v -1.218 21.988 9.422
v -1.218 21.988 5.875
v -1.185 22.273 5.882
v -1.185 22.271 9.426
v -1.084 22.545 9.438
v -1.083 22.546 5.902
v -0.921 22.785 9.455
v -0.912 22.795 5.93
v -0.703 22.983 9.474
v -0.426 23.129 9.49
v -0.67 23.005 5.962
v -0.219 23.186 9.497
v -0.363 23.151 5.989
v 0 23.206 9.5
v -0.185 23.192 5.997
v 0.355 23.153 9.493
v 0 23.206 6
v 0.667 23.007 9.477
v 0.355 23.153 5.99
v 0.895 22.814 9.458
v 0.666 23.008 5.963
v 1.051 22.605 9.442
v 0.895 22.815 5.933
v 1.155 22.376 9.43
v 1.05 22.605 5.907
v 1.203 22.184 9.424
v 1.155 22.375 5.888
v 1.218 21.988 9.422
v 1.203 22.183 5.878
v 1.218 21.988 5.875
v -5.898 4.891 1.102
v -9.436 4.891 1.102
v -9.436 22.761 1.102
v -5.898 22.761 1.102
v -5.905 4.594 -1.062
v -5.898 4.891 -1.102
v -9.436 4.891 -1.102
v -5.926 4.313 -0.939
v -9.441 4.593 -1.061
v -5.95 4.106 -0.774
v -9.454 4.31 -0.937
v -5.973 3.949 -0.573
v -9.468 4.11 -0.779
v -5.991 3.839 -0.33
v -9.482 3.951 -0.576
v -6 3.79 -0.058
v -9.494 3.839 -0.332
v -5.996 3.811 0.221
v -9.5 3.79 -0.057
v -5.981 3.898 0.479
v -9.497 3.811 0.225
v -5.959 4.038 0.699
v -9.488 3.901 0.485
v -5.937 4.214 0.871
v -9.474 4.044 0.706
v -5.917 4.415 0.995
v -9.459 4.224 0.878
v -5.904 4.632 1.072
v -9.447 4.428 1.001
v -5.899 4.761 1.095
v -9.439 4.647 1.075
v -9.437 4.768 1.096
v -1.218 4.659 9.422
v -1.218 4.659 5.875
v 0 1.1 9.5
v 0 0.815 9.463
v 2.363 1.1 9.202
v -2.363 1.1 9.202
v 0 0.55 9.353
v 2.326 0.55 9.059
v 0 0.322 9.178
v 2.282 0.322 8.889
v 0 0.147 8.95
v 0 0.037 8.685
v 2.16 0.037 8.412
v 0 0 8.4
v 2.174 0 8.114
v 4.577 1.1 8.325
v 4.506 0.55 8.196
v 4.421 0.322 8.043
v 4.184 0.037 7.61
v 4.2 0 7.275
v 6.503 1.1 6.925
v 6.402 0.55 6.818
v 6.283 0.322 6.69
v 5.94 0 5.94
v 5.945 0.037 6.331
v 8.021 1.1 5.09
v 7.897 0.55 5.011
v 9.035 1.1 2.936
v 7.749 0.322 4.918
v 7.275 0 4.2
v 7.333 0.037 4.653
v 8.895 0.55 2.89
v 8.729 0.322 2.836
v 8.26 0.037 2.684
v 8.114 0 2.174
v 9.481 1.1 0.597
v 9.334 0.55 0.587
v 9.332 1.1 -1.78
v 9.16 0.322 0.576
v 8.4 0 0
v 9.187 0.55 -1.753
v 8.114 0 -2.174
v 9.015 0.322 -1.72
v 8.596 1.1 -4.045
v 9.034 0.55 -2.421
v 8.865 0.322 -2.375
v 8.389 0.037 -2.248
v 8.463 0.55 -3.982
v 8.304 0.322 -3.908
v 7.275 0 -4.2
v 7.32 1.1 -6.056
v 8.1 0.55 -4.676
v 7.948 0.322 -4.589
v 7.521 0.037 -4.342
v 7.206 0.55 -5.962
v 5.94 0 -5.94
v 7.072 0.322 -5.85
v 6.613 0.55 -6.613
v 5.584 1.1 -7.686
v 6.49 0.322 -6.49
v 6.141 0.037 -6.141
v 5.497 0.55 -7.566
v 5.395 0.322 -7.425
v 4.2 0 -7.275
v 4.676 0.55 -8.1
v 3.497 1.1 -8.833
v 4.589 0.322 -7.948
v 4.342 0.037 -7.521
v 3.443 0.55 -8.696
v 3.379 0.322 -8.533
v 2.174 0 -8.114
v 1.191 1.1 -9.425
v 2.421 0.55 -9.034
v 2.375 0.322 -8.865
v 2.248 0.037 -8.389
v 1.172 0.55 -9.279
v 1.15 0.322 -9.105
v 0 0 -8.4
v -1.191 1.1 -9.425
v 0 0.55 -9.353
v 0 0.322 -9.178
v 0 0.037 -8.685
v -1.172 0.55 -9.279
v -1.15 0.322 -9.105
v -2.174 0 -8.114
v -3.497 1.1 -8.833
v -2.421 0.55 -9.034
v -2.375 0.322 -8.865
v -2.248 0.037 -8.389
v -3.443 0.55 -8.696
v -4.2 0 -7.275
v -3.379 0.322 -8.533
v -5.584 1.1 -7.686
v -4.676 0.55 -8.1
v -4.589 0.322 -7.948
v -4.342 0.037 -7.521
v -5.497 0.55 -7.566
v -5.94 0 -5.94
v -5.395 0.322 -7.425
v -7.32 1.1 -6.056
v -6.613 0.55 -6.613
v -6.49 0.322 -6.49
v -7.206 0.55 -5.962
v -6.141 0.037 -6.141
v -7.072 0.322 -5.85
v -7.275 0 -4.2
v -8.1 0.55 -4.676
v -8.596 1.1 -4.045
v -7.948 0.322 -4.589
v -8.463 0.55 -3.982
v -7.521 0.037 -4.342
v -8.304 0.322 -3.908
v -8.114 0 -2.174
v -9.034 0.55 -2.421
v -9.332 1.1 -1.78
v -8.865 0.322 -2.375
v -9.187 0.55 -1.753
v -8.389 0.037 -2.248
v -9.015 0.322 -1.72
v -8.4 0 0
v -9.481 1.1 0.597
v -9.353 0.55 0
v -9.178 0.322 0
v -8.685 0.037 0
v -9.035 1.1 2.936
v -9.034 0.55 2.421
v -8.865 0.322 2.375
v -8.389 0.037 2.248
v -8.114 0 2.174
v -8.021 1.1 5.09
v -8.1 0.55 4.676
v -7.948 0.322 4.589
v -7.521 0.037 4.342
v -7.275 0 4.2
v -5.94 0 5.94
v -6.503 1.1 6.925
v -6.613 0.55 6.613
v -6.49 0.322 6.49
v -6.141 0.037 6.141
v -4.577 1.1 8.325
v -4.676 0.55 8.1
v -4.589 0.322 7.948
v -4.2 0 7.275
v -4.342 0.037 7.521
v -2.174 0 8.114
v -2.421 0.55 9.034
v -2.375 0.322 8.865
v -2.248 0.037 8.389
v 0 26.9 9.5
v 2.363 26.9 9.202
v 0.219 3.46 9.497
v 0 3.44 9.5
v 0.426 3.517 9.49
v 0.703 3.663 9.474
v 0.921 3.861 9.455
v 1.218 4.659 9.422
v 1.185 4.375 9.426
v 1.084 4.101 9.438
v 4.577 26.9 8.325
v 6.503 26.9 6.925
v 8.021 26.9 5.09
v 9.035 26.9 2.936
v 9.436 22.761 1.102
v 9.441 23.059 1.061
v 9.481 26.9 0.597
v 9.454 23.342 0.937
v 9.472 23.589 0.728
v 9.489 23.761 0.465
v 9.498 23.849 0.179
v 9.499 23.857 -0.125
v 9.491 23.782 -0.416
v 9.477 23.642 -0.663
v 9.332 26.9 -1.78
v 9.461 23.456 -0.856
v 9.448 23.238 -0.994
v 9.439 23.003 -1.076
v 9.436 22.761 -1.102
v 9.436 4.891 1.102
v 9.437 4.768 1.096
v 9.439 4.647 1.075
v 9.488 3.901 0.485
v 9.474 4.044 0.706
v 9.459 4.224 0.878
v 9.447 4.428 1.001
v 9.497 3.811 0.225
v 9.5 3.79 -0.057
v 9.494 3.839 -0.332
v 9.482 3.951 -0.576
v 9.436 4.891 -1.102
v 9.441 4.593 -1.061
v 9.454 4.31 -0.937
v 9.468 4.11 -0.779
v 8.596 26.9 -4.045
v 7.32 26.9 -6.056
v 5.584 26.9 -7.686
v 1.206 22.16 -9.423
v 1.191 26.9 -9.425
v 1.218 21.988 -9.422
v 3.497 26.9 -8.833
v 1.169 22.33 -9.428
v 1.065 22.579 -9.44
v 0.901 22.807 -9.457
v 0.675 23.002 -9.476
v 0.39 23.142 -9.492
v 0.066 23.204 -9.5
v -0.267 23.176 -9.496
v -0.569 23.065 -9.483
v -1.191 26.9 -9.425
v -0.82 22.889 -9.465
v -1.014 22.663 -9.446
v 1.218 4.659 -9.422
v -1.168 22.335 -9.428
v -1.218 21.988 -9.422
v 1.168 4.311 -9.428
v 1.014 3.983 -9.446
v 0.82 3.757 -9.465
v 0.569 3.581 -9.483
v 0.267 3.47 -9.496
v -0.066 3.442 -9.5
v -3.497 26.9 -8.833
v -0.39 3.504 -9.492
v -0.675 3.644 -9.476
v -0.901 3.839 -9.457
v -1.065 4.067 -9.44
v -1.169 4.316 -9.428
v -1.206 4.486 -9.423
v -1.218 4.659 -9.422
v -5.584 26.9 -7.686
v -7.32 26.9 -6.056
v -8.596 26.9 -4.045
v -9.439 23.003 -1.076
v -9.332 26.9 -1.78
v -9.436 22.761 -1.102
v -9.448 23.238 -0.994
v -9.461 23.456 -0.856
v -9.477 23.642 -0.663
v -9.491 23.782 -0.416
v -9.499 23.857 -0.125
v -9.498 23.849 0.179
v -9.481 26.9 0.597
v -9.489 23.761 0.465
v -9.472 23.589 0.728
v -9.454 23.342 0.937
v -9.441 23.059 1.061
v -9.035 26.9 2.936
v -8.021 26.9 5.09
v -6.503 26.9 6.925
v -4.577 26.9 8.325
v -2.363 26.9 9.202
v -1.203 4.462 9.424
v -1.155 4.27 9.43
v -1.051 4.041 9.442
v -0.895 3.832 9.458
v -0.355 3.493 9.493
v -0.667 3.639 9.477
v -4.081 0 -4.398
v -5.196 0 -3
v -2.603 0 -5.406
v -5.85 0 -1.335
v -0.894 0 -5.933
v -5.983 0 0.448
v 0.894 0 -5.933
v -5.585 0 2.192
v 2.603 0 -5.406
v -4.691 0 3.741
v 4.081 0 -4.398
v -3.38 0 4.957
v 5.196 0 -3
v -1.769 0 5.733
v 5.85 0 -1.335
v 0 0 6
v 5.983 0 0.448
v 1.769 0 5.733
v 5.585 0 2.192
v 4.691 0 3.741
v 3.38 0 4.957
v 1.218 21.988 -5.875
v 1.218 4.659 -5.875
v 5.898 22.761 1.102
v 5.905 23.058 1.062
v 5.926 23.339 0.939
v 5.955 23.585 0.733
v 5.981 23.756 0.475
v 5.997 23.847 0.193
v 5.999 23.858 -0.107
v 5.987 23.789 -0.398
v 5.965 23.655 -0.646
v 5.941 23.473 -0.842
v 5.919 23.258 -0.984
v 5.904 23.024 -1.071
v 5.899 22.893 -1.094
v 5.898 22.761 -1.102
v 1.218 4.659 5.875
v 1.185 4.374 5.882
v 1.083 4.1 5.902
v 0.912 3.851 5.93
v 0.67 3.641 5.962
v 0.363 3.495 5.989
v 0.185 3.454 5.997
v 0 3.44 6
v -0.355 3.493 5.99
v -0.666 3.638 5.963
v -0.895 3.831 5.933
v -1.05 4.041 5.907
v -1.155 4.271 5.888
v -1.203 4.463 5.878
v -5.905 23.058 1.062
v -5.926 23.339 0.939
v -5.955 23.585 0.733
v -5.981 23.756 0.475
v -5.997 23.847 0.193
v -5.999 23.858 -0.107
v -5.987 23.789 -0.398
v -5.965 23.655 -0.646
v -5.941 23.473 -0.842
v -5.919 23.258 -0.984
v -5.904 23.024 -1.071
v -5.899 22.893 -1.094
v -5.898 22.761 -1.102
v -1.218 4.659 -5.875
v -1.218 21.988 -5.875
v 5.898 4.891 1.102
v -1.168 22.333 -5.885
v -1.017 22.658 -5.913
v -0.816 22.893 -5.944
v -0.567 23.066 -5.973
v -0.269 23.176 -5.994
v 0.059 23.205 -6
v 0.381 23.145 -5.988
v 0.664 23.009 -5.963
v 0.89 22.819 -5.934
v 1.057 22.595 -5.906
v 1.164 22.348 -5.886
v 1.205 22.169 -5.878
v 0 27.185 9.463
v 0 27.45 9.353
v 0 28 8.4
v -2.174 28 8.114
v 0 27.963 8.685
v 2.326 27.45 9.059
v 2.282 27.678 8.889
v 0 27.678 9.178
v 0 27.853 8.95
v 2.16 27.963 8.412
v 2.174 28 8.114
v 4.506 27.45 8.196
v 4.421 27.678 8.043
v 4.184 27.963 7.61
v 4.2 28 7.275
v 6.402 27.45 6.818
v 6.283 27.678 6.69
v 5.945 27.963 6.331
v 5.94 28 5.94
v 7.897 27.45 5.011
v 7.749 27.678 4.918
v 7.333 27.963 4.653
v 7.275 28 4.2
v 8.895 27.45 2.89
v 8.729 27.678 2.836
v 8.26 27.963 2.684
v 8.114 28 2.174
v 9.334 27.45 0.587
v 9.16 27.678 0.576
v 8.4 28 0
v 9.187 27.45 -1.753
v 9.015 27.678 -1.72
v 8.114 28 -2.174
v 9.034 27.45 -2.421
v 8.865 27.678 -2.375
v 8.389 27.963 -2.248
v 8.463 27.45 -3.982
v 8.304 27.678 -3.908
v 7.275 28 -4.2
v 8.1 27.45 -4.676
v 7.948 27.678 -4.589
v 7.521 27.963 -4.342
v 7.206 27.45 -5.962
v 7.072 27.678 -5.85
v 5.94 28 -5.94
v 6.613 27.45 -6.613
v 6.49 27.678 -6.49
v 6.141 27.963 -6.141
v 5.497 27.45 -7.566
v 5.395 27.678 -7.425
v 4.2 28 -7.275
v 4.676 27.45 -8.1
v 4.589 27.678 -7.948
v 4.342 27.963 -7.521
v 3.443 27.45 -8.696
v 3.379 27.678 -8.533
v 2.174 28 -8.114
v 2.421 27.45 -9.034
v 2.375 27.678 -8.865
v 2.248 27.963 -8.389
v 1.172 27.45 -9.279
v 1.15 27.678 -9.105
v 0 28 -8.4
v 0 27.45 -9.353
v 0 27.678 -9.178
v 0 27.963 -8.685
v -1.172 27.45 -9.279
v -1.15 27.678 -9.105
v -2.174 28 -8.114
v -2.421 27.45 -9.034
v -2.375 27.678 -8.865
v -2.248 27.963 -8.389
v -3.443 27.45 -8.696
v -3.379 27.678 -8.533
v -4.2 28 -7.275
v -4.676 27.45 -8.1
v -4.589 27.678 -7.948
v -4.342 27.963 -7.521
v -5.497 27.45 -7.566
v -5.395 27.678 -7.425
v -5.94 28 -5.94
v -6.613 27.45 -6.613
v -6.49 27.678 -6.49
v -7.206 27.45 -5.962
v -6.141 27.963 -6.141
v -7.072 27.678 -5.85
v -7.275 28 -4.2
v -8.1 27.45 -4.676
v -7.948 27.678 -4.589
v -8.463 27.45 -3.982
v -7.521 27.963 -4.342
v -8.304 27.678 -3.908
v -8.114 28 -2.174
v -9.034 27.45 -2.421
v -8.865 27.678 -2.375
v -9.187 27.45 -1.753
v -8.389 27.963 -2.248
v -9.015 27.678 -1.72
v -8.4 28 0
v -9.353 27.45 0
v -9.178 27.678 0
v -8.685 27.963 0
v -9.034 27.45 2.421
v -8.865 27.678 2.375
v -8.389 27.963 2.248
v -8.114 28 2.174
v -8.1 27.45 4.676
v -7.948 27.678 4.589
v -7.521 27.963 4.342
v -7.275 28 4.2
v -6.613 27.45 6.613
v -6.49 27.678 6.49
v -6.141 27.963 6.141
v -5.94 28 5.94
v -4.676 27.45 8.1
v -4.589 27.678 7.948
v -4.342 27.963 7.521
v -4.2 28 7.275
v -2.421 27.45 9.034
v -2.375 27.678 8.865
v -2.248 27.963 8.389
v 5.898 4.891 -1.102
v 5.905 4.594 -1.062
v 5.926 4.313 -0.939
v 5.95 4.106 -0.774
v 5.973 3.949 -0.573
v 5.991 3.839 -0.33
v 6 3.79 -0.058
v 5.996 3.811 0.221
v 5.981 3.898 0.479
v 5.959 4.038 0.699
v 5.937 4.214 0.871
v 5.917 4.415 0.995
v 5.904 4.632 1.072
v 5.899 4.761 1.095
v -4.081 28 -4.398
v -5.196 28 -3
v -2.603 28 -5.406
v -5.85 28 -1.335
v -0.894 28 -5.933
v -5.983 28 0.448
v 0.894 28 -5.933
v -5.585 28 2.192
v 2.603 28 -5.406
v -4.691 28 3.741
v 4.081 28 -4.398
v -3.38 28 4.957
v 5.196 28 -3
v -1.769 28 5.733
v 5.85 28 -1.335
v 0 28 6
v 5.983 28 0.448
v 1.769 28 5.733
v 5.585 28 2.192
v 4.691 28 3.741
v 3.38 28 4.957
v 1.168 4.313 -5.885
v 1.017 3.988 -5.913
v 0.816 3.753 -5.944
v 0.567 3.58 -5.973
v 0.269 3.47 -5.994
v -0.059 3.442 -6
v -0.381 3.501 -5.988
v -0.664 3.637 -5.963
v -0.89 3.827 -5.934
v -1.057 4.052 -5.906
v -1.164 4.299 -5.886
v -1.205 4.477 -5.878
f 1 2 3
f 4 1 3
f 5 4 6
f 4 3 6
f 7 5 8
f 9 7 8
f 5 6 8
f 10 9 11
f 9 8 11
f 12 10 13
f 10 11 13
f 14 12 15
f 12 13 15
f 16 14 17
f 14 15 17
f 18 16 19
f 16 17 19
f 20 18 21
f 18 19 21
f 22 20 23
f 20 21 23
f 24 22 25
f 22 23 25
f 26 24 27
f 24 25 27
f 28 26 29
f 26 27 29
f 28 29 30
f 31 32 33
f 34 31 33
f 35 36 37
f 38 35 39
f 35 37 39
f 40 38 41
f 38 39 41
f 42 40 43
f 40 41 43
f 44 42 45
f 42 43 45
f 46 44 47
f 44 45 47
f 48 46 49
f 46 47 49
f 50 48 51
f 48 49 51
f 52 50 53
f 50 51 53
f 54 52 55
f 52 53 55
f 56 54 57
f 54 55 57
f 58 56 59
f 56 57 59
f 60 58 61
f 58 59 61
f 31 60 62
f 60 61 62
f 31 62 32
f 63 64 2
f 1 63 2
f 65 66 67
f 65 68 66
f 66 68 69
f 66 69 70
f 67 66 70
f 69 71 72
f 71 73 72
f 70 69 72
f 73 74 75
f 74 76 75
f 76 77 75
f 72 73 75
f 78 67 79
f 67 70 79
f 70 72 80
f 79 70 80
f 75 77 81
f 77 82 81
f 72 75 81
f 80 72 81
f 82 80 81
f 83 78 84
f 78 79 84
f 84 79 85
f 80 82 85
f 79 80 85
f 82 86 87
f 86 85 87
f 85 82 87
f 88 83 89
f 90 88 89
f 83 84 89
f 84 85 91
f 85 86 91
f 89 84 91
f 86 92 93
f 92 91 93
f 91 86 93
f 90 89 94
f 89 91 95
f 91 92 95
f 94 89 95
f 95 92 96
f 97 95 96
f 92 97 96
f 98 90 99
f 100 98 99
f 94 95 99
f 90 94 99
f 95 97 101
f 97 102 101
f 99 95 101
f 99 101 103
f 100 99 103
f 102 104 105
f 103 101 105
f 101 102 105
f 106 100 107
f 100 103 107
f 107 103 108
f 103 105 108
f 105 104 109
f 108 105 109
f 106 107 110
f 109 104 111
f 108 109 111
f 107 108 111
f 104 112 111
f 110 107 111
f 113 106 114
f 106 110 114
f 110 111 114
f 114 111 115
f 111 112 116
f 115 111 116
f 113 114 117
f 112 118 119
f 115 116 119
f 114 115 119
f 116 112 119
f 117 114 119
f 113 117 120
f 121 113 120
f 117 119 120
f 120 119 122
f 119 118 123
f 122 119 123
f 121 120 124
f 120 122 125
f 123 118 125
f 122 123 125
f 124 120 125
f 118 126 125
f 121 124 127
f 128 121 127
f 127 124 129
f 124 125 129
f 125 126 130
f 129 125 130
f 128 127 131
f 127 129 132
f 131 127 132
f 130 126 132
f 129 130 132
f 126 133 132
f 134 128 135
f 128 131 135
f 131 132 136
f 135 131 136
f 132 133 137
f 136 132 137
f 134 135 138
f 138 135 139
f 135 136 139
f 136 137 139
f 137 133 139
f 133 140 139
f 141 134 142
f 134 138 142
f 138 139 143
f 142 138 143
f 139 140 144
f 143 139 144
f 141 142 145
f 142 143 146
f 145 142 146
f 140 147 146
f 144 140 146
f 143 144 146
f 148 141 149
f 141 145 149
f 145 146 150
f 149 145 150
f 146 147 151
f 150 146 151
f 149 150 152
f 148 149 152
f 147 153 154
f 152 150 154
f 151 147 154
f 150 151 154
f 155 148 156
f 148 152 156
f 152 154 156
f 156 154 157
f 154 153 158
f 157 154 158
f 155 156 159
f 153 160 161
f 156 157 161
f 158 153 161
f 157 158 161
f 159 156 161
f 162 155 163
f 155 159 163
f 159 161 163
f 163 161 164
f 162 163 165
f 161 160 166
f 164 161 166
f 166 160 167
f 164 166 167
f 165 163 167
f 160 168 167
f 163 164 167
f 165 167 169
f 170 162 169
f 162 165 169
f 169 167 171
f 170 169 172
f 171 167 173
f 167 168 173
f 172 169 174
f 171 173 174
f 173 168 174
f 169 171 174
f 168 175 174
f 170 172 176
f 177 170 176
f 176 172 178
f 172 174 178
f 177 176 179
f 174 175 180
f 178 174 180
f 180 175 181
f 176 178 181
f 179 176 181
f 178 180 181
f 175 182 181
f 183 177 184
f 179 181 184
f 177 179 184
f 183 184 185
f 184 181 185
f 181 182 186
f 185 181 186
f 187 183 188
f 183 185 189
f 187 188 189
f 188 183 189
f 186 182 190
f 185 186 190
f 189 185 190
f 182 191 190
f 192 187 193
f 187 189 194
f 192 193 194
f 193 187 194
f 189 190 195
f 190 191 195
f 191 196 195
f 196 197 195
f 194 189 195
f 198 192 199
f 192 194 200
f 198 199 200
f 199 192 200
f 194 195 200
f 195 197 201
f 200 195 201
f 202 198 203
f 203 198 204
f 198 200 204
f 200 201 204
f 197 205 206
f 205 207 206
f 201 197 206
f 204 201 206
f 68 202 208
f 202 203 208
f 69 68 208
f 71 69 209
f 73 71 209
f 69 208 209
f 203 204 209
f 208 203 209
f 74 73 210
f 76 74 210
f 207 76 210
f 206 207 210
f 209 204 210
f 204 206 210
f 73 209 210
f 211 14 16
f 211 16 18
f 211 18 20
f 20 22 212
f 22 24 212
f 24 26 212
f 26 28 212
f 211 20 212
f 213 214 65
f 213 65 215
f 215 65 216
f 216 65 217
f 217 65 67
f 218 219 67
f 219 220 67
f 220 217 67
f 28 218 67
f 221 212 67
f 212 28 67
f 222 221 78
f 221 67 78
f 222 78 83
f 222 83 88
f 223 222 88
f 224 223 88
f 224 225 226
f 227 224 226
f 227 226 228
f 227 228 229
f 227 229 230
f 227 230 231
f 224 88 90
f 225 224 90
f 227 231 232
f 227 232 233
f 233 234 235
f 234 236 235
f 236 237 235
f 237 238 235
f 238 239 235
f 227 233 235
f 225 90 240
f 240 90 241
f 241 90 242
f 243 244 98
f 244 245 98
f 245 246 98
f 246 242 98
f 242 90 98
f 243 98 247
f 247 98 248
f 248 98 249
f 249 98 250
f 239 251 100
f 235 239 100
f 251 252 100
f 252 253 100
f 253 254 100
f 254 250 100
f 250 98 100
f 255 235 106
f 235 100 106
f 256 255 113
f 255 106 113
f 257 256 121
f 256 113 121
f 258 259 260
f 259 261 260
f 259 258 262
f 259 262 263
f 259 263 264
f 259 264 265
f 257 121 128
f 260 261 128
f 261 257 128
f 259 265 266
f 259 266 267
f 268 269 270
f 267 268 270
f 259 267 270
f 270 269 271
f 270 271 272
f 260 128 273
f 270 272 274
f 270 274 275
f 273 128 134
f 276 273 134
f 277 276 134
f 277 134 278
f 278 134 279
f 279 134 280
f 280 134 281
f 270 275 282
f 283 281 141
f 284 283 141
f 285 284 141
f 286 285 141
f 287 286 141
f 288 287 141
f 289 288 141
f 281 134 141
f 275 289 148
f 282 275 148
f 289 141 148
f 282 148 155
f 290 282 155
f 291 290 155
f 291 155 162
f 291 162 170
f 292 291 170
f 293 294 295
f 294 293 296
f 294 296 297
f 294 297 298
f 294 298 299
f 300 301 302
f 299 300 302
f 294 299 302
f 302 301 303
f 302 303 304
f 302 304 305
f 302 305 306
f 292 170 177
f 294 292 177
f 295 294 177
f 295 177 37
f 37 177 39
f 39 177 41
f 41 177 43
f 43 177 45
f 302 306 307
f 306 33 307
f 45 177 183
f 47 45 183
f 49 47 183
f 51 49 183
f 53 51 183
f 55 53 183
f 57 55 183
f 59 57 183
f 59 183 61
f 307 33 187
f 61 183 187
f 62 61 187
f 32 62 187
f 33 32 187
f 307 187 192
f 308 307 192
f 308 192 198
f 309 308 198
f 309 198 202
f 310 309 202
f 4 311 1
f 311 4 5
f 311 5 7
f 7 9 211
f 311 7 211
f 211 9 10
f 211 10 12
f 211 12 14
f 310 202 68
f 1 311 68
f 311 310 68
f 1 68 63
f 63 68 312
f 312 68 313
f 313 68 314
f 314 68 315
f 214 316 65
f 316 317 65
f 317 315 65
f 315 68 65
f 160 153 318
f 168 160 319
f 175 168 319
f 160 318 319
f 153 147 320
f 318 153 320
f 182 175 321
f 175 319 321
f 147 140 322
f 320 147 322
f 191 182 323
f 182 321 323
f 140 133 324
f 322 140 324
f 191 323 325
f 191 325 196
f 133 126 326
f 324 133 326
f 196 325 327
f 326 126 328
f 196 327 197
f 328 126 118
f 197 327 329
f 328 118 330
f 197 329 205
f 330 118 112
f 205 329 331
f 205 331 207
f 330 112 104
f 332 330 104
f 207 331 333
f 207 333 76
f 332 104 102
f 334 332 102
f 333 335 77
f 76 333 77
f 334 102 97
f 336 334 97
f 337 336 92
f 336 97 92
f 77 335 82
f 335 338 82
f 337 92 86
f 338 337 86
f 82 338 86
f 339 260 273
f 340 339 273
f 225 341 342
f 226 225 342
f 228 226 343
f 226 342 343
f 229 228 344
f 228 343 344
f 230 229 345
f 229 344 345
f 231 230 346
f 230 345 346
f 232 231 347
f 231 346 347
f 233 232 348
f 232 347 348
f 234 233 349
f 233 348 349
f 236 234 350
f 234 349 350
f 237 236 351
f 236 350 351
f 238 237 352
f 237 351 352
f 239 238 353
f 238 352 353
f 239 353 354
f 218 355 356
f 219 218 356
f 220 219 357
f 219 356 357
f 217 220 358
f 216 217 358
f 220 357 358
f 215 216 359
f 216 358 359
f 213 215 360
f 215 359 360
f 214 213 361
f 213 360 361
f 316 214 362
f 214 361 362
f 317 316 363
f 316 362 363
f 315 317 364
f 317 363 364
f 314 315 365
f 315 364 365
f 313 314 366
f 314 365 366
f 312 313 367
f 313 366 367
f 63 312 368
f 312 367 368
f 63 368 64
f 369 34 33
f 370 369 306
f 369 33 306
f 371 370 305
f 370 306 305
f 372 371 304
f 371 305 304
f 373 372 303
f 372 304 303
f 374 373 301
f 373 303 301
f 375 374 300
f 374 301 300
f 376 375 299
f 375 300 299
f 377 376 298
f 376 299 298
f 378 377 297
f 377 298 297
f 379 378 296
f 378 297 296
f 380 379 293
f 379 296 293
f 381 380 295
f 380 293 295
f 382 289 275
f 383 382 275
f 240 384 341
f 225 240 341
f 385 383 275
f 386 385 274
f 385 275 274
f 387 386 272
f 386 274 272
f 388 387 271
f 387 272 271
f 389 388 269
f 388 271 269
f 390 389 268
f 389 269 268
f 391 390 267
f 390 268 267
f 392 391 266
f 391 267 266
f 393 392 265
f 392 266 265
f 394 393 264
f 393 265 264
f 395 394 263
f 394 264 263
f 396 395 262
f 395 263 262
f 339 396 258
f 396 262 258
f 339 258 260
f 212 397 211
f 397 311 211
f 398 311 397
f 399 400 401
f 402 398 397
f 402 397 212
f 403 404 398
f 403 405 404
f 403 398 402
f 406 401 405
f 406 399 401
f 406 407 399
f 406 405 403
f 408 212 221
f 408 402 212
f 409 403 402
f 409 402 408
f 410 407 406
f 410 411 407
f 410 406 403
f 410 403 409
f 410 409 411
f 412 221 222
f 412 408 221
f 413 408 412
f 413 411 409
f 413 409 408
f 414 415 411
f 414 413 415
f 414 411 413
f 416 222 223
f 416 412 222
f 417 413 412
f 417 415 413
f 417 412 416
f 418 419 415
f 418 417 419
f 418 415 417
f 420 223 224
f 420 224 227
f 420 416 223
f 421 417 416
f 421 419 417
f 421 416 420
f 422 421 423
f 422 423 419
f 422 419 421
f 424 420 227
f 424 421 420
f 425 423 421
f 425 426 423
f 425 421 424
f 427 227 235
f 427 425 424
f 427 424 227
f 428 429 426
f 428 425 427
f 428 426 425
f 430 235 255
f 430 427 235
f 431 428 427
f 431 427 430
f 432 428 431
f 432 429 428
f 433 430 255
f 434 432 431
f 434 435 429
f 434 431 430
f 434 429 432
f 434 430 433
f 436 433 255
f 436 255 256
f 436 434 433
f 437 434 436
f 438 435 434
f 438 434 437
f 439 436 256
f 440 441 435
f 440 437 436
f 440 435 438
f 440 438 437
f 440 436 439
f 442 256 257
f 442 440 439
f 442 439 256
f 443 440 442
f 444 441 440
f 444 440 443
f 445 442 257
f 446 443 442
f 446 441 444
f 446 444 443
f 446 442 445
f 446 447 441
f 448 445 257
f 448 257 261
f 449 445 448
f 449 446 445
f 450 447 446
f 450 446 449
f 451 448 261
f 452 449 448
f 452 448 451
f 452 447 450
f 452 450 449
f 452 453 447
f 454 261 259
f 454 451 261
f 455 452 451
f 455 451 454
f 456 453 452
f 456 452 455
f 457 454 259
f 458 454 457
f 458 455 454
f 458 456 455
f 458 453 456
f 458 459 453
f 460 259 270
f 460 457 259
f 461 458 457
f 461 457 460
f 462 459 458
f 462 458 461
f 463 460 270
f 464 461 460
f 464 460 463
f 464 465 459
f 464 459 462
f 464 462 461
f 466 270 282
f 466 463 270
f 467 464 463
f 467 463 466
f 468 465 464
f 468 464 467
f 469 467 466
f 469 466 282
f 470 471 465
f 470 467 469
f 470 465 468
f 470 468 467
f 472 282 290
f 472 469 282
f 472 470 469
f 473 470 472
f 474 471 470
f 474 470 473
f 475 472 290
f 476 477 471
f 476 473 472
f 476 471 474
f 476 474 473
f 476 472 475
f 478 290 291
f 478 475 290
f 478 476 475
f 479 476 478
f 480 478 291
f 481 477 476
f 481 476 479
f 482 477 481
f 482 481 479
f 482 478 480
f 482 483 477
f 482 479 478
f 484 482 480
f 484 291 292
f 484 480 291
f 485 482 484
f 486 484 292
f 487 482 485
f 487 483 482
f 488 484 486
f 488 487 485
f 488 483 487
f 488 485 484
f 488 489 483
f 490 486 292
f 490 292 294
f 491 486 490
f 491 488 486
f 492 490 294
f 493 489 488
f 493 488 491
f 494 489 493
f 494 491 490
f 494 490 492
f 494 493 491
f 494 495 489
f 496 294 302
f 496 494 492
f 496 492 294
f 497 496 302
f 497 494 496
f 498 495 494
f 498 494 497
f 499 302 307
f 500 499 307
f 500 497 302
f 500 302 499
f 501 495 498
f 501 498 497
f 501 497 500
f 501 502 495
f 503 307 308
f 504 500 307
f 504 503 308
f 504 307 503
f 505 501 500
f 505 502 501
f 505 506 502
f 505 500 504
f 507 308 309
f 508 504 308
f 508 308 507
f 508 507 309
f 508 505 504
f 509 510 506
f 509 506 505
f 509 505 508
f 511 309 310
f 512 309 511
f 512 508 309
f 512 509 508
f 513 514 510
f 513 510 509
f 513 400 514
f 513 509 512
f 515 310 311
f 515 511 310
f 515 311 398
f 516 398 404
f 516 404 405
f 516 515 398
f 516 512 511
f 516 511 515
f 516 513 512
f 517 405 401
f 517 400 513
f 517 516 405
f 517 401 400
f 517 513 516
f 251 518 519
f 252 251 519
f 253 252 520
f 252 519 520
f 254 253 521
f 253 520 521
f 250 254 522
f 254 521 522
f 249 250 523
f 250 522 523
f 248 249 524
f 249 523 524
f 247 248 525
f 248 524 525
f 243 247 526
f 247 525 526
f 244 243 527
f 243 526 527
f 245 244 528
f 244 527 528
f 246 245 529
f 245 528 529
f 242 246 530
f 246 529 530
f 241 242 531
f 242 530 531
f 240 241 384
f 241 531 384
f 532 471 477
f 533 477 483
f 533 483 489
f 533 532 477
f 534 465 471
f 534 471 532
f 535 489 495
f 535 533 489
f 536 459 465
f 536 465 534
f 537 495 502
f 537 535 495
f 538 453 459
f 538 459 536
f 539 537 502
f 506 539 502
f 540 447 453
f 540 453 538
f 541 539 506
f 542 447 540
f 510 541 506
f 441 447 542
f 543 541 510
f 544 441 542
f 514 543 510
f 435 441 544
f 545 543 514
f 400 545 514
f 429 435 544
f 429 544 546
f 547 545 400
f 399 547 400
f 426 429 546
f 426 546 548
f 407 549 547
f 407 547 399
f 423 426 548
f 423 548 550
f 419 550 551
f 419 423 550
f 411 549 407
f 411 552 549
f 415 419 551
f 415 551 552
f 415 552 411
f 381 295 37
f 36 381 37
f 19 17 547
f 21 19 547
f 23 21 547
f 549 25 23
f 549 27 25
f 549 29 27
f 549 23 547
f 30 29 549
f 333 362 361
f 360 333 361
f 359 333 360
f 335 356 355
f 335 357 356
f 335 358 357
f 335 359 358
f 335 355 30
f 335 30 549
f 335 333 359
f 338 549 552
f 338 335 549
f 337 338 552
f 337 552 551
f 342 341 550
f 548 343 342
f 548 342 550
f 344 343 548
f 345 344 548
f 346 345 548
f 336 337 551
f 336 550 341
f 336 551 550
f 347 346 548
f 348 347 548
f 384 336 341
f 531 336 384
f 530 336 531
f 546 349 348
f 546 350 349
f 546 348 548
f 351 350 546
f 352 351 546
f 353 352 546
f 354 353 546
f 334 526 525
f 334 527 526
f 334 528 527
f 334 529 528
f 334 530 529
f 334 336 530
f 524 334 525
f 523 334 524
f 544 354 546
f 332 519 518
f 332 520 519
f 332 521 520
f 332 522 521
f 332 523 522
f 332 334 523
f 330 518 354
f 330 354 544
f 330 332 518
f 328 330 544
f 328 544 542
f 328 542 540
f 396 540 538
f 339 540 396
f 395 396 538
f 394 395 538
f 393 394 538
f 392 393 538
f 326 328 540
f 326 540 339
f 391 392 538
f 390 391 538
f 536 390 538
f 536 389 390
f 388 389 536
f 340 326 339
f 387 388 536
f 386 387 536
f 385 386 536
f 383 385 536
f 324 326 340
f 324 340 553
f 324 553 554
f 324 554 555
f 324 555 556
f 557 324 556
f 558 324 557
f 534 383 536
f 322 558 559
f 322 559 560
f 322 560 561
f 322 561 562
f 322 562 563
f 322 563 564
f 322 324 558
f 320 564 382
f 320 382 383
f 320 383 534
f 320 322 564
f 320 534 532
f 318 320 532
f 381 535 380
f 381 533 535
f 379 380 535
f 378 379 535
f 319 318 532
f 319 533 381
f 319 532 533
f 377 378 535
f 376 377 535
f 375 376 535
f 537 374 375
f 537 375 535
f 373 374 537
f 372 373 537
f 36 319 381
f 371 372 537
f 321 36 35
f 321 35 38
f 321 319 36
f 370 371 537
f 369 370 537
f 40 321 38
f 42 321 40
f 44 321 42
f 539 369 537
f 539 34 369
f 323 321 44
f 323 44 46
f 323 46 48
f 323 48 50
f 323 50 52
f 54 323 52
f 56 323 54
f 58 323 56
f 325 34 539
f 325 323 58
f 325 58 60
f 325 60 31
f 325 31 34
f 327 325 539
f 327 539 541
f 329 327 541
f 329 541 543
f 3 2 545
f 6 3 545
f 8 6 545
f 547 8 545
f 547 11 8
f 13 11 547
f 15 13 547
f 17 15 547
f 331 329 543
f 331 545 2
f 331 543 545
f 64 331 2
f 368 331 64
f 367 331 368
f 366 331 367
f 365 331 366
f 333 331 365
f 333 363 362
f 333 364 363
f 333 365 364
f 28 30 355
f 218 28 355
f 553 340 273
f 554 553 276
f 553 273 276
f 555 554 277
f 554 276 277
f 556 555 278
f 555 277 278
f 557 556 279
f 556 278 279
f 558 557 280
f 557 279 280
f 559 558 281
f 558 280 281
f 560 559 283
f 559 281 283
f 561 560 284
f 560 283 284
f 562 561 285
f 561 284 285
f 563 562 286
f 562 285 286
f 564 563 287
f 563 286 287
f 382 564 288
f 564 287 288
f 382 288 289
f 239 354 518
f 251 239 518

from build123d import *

# Parameters (mm, degrees)
SKETCH_1_R               = 9.5
SKETCH_1_R_2             = 6
EXTRUDE_1_DEPTH          = 28
FILLET_1_R               = 1.1
CUT_EXTRUDE_1_DEPTH      = 15
CUT_EXTRUDE_1_DEPTH_BACK = 17
CUT_EXTRUDE_2_DEPTH      = 17
CUT_EXTRUDE_2_DEPTH_BACK = 17


with BuildPart() as part:
    # Эскиз1 → Бобышка-Вытянуть1 (new body)
    with BuildSketch(Plane(origin=(0, 0, 0), x_dir=(1, 0, 0), z_dir=(0, 1, 0))):
        with Locations(Location((0, 0, 0), (0, 0, 270))):
            Circle(SKETCH_1_R)
        with Locations(Location((0, 0, 0), (0, 0, 270))):
            Circle(SKETCH_1_R_2, mode=Mode.SUBTRACT)
    extrude(amount=EXTRUDE_1_DEPTH)

    # Скругление1
    fillet_1_edges = [part.edges().sort_by_distance(p)[0] for p in [
        (0, 0, -9.5),
        (0, 28, -9.5),
    ]]
    fillet(fillet_1_edges, radius=FILLET_1_R)

    # Эскиз2 → Вырез-Вытянуть1 (cut, two sides: drawn at the far end of the back side and taken through both)
    with BuildSketch(Plane.XY.offset(-CUT_EXTRUDE_1_DEPTH_BACK)):
        with BuildLine():
            Line((1.218447758, 21.987601969), (1.218447758, 4.658567189))
            ThreePointArc((1.218447758, 4.658567189), (0, 3.440119431), (-1.218447758, 4.658567189))
            Line((-1.218447758, 4.658567189), (-1.218447758, 21.987601969))
            ThreePointArc((-1.218447758, 21.987601969), (0, 23.206049726), (1.218447758, 21.987601969))
        make_face()
    extrude(amount=CUT_EXTRUDE_1_DEPTH + CUT_EXTRUDE_1_DEPTH_BACK, mode=Mode.SUBTRACT)

    # Эскиз3 → Вырез-Вытянуть2 (cut, two sides: drawn at the far end of the back side and taken through both)
    with BuildSketch(Plane(origin=(0, 0, 0), x_dir=(0, 0, -1), z_dir=(1, 0, 0)).offset(-CUT_EXTRUDE_2_DEPTH_BACK)):
        with BuildLine():
            Line((1.102405114, 22.761219593), (1.102405114, 4.890652477))
            ThreePointArc((1.102405114, 4.890652477), (0, 3.788247362), (-1.102405114, 4.890652477))
            Line((-1.102405114, 4.890652477), (-1.102405114, 22.761219593))
            ThreePointArc((-1.102405114, 22.761219593), (0, 23.863624707), (1.102405114, 22.761219593))
        make_face()
    extrude(amount=CUT_EXTRUDE_2_DEPTH + CUT_EXTRUDE_2_DEPTH_BACK, mode=Mode.SUBTRACT)


solid = part.part
